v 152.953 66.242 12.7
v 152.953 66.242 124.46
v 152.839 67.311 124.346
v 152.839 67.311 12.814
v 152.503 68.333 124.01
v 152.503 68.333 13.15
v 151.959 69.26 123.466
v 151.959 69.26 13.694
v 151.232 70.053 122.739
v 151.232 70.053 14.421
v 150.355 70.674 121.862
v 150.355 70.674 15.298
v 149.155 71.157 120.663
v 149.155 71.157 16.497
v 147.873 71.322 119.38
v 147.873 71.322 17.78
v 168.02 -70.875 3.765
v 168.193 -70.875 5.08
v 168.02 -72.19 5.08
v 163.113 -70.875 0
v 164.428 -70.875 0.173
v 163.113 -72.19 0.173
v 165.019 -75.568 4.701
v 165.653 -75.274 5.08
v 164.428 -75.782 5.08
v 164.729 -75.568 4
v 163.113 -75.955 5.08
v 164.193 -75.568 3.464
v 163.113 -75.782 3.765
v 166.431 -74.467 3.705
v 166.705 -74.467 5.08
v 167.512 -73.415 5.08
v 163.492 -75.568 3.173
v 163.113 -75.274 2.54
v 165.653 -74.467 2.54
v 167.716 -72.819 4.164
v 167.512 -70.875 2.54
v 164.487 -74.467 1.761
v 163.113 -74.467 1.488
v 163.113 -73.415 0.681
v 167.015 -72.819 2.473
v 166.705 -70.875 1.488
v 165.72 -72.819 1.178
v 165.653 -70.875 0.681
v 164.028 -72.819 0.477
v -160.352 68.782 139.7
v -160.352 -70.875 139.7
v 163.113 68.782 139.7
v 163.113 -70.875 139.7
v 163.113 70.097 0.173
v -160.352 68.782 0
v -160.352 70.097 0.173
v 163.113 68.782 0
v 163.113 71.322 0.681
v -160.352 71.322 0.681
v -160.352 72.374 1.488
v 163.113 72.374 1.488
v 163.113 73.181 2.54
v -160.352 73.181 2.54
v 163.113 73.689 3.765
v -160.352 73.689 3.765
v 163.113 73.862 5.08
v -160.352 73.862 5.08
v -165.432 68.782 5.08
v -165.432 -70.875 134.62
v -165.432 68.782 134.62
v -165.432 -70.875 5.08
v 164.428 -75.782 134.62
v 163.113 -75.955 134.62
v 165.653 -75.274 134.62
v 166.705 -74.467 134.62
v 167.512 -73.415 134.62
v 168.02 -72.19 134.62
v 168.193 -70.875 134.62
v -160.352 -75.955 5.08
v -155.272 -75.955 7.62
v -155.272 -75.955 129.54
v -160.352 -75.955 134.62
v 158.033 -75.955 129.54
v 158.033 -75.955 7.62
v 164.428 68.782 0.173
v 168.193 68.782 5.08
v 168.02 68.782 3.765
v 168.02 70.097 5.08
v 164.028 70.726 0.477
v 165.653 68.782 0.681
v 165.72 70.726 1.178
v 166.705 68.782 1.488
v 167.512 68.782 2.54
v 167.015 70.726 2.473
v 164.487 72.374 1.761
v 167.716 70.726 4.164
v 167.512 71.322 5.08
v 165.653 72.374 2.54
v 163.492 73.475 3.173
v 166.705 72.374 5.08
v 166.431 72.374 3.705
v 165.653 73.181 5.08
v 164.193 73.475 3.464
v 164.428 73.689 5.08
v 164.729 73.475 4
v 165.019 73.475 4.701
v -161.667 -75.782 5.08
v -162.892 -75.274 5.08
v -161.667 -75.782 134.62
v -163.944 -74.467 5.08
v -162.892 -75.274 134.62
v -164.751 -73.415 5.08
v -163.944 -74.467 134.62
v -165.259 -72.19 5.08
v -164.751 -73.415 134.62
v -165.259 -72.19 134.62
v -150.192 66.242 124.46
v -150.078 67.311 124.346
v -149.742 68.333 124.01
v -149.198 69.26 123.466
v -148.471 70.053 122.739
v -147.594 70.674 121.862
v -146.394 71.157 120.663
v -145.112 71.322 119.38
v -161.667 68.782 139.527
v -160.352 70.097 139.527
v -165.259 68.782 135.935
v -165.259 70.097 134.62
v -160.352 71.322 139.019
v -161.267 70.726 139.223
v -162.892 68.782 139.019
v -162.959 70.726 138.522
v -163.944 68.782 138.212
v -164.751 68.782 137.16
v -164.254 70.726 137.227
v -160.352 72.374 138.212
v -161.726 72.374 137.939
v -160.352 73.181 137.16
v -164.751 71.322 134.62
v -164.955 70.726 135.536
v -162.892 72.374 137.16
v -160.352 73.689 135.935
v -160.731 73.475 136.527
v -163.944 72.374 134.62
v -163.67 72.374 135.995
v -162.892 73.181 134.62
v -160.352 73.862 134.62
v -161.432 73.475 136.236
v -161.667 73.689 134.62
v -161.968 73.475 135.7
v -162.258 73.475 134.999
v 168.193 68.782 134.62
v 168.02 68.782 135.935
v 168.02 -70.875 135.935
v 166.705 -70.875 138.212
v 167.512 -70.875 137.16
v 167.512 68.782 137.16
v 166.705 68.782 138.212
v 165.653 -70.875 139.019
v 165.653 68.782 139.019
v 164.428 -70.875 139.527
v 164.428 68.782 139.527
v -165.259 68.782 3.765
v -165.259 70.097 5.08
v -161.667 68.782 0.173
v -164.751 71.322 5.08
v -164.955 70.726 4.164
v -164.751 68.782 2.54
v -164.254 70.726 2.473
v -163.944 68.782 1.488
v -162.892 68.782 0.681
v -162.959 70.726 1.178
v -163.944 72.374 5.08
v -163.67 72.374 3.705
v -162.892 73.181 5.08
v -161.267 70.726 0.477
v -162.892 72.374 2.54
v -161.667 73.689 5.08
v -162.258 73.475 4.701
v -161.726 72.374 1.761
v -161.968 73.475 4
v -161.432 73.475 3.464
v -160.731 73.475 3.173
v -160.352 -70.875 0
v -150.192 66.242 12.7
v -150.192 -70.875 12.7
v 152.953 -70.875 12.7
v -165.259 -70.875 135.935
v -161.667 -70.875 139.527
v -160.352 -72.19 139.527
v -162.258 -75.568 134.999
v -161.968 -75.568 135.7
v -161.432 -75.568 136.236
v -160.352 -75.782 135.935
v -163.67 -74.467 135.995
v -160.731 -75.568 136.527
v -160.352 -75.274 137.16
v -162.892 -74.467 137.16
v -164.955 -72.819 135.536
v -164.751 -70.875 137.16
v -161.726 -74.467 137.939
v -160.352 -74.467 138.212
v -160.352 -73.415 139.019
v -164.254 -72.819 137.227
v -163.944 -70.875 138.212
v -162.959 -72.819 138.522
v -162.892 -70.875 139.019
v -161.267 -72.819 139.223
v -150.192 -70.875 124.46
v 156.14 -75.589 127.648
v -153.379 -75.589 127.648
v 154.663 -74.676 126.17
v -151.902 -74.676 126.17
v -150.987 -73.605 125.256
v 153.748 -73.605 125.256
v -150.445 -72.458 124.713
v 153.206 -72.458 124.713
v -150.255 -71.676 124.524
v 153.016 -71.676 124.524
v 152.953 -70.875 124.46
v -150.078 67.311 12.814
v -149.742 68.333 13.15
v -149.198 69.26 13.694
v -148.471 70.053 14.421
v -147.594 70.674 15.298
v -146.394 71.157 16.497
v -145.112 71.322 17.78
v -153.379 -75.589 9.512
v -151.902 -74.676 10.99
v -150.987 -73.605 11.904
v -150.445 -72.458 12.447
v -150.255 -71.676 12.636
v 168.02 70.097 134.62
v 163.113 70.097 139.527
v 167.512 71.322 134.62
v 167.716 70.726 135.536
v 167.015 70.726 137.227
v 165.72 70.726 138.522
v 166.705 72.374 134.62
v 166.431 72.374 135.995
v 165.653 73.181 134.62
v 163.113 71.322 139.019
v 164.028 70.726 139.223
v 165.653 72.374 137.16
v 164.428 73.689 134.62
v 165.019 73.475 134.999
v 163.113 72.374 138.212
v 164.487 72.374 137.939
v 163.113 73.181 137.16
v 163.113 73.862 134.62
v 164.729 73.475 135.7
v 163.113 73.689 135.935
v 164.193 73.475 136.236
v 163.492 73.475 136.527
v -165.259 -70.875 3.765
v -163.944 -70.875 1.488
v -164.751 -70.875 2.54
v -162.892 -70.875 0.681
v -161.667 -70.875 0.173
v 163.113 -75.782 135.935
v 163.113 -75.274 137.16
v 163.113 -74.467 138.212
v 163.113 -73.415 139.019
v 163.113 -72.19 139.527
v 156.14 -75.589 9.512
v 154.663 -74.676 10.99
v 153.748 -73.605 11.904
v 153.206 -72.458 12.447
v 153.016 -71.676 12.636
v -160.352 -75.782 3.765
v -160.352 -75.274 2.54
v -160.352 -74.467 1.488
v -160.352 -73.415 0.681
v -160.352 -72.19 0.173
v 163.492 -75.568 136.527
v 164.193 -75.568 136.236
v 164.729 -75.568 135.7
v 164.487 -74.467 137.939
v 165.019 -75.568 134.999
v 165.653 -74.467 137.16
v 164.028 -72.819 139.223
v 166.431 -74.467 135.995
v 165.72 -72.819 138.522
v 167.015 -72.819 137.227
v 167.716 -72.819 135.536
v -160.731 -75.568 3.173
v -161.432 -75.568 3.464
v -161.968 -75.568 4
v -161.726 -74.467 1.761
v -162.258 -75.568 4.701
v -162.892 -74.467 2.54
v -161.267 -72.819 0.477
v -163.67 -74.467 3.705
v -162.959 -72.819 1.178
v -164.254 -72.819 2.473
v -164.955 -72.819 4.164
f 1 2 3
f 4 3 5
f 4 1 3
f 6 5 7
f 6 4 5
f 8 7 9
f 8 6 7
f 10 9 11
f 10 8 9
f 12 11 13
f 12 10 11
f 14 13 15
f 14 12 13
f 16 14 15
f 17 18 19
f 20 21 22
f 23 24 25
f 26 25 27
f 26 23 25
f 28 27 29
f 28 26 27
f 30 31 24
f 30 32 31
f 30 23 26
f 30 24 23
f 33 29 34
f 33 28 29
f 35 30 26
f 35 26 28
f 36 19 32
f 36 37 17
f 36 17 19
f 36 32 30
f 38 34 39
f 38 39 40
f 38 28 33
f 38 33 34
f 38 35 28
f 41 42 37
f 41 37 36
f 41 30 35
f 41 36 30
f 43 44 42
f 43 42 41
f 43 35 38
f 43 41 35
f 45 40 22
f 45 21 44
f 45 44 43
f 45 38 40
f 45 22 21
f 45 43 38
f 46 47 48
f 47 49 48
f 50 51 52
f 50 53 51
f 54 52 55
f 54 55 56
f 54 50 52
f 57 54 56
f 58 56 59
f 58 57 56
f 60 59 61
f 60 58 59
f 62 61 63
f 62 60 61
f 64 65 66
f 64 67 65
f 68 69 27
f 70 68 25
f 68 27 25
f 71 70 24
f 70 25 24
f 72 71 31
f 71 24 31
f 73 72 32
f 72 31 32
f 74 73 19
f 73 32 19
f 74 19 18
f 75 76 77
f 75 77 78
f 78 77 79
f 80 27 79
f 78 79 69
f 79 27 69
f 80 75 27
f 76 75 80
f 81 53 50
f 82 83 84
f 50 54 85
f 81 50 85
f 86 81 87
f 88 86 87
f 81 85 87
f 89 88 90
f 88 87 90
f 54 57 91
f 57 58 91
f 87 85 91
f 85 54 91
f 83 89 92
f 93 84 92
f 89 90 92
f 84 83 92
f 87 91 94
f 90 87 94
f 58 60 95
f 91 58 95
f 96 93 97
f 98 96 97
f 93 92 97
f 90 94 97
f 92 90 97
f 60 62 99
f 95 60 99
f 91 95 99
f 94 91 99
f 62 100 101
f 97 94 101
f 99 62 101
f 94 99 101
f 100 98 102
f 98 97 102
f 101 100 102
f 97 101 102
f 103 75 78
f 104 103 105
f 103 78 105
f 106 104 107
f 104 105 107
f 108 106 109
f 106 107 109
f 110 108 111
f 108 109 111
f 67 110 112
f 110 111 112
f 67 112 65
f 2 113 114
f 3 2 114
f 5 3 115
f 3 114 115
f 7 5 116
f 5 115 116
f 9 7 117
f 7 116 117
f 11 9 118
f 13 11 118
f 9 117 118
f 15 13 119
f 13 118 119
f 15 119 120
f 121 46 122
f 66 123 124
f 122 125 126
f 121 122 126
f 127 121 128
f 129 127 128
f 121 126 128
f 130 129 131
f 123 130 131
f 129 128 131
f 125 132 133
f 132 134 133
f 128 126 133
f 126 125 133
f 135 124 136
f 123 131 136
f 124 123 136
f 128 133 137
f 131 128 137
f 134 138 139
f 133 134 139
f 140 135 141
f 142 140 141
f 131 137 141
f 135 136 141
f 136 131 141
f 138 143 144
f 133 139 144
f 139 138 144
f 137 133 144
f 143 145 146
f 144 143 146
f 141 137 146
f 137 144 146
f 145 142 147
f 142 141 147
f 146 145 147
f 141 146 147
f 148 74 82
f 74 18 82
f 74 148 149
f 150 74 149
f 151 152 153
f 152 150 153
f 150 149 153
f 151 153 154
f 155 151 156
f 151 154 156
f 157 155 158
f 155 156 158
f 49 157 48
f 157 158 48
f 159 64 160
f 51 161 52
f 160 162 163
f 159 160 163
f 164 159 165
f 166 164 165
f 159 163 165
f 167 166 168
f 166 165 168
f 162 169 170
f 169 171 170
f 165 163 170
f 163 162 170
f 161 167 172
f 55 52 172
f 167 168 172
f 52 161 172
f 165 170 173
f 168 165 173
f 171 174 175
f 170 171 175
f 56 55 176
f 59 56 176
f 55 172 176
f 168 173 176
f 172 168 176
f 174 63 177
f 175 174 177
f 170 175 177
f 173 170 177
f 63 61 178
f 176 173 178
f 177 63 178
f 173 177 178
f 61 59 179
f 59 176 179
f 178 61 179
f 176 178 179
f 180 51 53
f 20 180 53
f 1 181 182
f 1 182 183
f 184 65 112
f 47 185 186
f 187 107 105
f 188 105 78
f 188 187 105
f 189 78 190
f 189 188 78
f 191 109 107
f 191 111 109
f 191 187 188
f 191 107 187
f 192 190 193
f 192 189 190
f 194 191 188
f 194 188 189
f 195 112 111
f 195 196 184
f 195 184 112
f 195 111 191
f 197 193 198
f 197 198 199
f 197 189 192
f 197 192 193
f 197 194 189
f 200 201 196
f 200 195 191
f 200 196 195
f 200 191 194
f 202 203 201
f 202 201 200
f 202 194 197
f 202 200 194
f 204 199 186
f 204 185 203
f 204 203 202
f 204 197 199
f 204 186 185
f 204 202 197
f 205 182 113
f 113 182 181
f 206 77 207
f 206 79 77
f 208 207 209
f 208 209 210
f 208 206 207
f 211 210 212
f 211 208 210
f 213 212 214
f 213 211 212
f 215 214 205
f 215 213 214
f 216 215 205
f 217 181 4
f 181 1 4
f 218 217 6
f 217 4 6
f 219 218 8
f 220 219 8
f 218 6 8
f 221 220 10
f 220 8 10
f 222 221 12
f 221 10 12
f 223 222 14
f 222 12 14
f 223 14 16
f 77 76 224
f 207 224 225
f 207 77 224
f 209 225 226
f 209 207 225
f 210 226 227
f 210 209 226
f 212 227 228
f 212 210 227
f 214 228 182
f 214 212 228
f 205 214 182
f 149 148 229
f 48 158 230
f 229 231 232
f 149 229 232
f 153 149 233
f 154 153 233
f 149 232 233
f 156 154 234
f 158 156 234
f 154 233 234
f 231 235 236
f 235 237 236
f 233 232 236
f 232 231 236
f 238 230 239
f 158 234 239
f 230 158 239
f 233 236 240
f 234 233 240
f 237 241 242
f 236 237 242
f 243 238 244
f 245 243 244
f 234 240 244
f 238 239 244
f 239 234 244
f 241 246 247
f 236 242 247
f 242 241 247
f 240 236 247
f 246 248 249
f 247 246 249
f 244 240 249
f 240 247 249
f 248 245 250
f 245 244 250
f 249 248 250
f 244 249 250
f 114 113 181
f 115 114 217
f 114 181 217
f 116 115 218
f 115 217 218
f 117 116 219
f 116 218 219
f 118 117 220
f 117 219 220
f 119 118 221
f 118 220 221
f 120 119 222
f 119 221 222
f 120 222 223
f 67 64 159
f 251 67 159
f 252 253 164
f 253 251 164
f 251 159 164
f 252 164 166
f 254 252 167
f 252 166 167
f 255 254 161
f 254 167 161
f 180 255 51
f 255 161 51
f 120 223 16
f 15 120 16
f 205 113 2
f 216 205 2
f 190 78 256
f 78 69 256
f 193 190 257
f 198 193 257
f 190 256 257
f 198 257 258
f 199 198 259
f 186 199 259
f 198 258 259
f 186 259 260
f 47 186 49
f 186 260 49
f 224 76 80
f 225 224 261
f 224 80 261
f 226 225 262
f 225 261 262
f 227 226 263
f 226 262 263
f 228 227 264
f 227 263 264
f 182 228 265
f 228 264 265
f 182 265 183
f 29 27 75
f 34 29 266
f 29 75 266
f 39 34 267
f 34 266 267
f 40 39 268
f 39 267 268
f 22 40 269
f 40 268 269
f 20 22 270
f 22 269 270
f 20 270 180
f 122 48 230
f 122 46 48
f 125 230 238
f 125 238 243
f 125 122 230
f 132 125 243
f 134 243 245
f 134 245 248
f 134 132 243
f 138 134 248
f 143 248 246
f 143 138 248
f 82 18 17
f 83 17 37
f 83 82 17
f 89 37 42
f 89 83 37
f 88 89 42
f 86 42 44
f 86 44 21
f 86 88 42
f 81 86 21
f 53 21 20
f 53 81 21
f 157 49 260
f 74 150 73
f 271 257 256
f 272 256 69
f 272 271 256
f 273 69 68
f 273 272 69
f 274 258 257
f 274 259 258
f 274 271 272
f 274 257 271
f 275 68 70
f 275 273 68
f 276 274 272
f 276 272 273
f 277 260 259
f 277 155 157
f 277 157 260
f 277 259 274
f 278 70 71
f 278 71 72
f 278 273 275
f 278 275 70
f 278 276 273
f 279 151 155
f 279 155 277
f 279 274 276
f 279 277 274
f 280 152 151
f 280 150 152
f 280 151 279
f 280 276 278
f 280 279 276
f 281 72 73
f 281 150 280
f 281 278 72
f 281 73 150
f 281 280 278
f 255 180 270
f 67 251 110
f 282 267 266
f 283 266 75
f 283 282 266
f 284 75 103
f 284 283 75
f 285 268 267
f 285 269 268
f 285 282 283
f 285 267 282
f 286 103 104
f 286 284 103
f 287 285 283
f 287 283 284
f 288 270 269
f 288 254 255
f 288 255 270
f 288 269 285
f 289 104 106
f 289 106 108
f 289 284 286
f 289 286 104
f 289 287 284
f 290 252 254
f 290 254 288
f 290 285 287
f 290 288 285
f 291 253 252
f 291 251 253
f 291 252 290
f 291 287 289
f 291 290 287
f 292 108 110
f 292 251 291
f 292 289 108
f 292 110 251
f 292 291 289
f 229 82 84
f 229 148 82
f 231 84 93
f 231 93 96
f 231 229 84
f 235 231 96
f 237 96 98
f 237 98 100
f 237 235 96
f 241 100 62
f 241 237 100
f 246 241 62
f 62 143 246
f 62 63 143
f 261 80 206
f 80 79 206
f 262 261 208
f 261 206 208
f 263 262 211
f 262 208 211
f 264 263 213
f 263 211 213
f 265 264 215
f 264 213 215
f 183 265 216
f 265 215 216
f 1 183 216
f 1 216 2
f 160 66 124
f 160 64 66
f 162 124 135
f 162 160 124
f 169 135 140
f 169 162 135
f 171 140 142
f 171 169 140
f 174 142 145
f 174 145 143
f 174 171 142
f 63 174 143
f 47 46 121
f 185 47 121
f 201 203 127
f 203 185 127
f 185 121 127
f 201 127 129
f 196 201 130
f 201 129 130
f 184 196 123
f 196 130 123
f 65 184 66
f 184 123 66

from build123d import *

# Parameters (mm, degrees)
F0_W     = 308.2244545221
F0_H     = 149.8168706894
F1_DEPTH = 127
F3_T     = -2.54
F2_W     = 308.2244545221
F2_H     = 149.8168706894
F4_DEPTH = 12.7
F5_DEPTH = 12.7
F6_DEPTH = 12.7
F7_DEPTH = 12.7
F8_R     = 5.08
F9_R     = 5.08
F10_R    = 5.08
F11_R    = 5.08
F12_R    = 5.08


with BuildPart() as f1:
    # F0 (on Top) → F1 (new body)
    with BuildSketch(Plane.XY):
        with Locations((1.3804957271, -1.0464191437)):
            Rectangle(F0_W, F0_H)
    extrude(amount=F1_DEPTH)

    # F3
    f3_openings = [f1.faces().sort_by_distance(p)[0] for p in [
        (1.380496, -75.954854, 63.5),
    ]]
    offset(amount=F3_T, openings=f3_openings)

    # F2 (on face) → F4 (join)
    with BuildSketch(Plane.XY.offset(127)):
        with Locations((1.3804957271, -1.0464191437)):
            Rectangle(F2_W, F2_H)
    extrude(amount=F4_DEPTH)

    # F5 (add): a face of the model
    f5_faces = [f1.faces().sort_by_distance(p)[0] for p in [
        (155.4927229881, -1.0464191437, 69.85),
    ]]
    extrude(f5_faces, amount=F5_DEPTH)

    # F6 (add): a face of the model
    f6_faces = [f1.faces().sort_by_distance(p)[0] for p in [
        (-152.731731534, -1.0464191437, 69.85),
    ]]
    extrude(f6_faces, amount=F6_DEPTH)

    # F0 (on Top) → F7 (join)
    with BuildSketch(Plane.XY):
        with Locations((1.3804957271, -1.0464191437)):
            Rectangle(F0_W, F0_H)
    extrude(amount=F7_DEPTH)

    # F8
    f8_edges = [f1.edges().sort_by_distance(p)[0] for p in [
        (-165.431732, -1.046419, 139.7),
        (-165.431732, -1.046419, 0),
        (168.192723, -1.046419, 139.7),
        (168.192723, -1.046419, 0),
    ]]
    fillet(f8_edges, radius=F8_R)

    # F9
    f9_edges = [f1.edges().sort_by_distance(p)[0] for p in [
        (1.380496, 73.862016, 139.7),
    ]]
    fillet(f9_edges, radius=F9_R)

    # F10
    f10_edges = [f1.edges().sort_by_distance(p)[0] for p in [
        (-150.191732, -75.954854, 68.58),
        (1.380496, -75.954854, 12.7),
        (1.380496, -75.954854, 124.46),
        (152.952723, -75.954854, 68.58),
    ]]
    fillet(f10_edges, radius=F10_R)

    # F11
    f11_edges = [f1.edges().sort_by_distance(p)[0] for p in [
        (1.380496, -75.954854, 139.7),
    ]]
    fillet(f11_edges, radius=F11_R)

    # F12
    f12_edges = [f1.edges().sort_by_distance(p)[0] for p in [
        (1.380496, 71.322016, 12.7),
        (-150.191732, 71.322016, 68.58),
        (1.380496, 71.322016, 124.46),
        (152.952723, 71.322016, 68.58),
    ]]
    fillet(f12_edges, radius=F12_R)


solid = f1.part
